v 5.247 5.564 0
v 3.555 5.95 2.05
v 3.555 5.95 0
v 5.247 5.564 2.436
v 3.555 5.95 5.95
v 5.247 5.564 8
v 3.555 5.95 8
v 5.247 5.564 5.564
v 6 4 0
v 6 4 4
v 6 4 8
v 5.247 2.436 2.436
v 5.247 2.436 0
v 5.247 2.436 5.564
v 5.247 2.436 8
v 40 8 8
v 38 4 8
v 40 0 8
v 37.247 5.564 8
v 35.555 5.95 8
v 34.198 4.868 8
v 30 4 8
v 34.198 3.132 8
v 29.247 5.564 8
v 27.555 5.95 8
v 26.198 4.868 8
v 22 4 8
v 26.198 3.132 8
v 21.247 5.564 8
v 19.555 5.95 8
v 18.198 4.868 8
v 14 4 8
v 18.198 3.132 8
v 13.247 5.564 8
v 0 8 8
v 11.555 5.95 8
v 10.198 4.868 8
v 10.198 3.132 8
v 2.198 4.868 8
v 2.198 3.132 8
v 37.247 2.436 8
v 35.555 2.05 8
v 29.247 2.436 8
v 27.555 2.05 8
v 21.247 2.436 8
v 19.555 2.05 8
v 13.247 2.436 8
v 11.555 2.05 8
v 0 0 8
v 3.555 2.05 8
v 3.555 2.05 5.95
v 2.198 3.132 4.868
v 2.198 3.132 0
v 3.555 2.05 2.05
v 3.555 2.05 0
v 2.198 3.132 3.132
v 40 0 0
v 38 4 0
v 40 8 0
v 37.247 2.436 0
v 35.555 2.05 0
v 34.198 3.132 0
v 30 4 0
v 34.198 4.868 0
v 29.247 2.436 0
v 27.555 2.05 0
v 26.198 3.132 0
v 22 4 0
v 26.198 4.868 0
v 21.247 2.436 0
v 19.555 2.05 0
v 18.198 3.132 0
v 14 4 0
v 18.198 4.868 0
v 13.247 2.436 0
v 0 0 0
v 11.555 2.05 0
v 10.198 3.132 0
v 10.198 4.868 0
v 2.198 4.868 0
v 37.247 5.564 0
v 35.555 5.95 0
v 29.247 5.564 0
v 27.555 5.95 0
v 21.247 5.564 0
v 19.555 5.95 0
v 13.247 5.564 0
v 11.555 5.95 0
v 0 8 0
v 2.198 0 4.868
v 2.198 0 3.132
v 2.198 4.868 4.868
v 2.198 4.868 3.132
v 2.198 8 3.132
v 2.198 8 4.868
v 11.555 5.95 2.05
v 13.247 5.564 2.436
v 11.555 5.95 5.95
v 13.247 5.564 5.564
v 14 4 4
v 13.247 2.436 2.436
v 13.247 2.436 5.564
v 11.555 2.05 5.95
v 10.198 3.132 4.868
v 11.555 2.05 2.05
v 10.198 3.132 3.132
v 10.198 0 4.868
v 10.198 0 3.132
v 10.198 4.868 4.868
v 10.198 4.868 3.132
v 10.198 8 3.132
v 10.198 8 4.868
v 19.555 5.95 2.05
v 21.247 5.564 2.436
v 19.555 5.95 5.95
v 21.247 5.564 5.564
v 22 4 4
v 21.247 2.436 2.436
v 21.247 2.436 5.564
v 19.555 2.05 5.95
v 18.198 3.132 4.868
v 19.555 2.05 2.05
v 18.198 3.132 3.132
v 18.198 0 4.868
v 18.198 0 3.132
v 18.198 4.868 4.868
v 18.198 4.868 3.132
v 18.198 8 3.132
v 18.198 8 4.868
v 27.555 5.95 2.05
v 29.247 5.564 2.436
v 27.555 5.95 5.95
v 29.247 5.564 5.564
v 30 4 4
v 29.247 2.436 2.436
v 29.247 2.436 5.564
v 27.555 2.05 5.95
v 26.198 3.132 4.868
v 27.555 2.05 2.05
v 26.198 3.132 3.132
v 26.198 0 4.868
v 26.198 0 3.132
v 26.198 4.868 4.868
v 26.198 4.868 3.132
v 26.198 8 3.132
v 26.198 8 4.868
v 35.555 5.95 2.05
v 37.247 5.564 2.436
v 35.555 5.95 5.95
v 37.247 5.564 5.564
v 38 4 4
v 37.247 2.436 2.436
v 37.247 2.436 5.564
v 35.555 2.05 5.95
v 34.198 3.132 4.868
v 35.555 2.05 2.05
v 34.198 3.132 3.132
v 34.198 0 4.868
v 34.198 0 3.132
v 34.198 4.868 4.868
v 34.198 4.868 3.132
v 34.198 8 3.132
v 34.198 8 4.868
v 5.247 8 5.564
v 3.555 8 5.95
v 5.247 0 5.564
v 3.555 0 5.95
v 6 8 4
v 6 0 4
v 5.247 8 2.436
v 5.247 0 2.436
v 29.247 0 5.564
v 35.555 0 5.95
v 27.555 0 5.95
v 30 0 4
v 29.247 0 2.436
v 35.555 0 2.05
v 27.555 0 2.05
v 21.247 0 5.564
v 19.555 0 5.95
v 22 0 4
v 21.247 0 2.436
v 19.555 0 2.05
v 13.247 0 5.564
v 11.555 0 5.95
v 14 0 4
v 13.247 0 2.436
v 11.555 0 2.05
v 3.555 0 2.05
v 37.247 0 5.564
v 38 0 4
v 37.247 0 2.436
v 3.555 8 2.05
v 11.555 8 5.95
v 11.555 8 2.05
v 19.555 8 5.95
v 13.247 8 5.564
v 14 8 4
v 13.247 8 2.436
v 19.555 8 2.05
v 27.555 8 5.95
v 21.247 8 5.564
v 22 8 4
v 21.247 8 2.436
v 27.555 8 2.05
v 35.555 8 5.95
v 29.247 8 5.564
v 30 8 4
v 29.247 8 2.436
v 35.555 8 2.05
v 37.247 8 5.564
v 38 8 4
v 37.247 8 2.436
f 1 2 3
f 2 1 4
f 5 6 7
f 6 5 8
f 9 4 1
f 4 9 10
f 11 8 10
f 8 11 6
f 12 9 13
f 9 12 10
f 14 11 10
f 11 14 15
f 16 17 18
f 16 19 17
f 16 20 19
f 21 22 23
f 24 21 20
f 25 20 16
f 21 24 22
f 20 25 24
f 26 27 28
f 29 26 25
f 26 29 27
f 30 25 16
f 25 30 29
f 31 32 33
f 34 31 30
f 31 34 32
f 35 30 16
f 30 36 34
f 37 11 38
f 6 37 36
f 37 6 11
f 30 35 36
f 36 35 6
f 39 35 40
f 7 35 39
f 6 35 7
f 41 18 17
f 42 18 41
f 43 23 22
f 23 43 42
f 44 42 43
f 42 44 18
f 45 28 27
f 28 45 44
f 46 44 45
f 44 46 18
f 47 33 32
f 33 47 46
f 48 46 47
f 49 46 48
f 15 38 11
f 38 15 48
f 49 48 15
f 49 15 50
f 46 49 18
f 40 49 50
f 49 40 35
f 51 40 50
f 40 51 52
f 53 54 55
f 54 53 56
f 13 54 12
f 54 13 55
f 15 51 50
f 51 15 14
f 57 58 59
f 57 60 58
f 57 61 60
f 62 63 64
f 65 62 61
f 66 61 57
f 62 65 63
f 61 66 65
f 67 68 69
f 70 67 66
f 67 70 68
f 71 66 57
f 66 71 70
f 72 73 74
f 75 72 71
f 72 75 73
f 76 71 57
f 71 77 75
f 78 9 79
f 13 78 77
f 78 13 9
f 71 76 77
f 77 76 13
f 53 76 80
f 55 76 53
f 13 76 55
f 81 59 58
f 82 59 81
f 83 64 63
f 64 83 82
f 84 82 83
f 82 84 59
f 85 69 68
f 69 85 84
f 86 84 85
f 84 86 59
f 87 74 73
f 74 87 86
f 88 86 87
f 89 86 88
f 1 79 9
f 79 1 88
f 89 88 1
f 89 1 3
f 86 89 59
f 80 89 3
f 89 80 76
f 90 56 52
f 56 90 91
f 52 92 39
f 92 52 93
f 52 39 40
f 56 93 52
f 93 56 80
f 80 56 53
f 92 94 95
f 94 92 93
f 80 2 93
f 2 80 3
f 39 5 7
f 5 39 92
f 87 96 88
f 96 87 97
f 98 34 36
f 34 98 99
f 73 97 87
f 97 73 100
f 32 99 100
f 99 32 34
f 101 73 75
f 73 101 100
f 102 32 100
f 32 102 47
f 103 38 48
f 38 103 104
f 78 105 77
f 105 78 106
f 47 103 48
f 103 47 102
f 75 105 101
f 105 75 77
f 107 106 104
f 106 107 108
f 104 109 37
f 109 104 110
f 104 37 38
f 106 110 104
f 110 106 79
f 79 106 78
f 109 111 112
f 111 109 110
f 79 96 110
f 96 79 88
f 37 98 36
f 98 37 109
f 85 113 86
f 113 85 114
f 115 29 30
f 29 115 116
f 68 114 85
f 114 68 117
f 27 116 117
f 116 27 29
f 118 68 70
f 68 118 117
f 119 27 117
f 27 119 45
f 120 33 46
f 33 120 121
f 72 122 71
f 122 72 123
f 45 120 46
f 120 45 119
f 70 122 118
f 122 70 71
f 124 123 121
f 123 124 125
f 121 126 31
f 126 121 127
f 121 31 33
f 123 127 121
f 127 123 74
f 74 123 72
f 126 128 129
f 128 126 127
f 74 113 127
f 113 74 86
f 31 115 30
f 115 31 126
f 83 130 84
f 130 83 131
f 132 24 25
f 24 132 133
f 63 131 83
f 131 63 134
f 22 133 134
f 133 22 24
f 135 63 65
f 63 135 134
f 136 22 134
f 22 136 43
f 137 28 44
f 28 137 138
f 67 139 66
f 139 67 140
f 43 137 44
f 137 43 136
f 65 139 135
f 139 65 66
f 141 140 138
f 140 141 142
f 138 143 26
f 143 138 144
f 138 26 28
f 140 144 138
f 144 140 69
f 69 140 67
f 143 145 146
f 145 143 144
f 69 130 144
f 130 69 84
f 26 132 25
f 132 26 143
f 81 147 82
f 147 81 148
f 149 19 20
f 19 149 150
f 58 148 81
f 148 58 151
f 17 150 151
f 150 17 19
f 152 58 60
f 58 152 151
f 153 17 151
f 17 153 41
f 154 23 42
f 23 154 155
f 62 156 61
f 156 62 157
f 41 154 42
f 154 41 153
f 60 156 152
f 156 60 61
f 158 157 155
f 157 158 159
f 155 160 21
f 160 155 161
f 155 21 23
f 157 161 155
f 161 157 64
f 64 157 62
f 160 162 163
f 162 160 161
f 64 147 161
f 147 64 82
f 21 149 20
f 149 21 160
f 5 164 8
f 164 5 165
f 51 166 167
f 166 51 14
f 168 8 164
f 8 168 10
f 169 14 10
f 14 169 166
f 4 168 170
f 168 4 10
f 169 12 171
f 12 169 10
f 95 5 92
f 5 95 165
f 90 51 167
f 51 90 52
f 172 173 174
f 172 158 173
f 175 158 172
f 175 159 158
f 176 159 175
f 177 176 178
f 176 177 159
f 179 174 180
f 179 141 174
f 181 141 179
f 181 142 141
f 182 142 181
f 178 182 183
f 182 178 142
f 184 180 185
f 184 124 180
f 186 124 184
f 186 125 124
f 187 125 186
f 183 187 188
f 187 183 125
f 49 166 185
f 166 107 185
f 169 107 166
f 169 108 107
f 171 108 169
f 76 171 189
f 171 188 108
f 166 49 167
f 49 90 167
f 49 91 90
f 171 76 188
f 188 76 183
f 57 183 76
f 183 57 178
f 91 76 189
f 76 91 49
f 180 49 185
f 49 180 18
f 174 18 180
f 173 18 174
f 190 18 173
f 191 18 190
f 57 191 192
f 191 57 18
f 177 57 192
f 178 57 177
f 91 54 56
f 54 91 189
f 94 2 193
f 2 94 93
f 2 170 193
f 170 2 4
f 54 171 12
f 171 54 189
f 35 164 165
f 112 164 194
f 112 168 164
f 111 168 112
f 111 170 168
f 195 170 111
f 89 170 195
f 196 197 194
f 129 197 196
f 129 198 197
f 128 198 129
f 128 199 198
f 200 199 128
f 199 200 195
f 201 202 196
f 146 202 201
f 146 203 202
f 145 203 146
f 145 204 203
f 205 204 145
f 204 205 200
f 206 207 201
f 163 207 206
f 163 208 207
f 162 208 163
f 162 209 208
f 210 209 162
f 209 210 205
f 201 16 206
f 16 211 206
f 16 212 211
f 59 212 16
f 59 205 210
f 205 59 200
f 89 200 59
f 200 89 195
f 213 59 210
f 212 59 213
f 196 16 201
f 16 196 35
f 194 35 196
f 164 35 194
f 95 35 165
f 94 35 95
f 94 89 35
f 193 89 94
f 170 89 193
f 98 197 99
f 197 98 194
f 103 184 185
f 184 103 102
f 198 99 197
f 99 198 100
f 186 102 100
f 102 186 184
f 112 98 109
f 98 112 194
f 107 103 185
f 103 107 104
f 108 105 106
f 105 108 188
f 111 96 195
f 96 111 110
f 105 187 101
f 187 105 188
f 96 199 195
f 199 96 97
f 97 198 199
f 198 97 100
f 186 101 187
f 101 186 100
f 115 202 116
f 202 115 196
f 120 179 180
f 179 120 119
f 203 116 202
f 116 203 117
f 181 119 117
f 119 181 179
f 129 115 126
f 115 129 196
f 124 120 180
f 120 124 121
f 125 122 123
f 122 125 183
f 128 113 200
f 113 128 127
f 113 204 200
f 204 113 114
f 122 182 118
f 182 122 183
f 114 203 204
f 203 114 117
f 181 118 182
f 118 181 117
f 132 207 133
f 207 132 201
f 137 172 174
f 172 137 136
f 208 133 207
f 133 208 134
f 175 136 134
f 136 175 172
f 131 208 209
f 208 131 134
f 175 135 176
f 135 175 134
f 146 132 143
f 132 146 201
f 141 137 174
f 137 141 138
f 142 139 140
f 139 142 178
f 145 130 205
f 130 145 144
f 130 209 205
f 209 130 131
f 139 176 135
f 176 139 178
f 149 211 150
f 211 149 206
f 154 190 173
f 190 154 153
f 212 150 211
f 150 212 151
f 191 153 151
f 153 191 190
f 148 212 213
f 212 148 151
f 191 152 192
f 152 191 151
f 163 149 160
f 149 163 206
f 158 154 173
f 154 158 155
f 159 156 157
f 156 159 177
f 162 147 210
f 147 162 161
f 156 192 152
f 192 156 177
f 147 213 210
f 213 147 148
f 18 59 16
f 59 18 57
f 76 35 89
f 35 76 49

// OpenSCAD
longueur_trous = 5;
difference(){
cube([longueur_trous * 8, 8, 8]);


union(){
    for(i=[0:longueur_trous]){
        translate([4+8*i, 4,0]){
                cylinder(h=8, r=2);
            }
        };
    for(i=[0:longueur_trous]){
        translate([4+8*i, 8,4]){
            rotate([90,0,0]){
                cylinder(h=8, r=2);
            }
            }
        }
        
    }
}
